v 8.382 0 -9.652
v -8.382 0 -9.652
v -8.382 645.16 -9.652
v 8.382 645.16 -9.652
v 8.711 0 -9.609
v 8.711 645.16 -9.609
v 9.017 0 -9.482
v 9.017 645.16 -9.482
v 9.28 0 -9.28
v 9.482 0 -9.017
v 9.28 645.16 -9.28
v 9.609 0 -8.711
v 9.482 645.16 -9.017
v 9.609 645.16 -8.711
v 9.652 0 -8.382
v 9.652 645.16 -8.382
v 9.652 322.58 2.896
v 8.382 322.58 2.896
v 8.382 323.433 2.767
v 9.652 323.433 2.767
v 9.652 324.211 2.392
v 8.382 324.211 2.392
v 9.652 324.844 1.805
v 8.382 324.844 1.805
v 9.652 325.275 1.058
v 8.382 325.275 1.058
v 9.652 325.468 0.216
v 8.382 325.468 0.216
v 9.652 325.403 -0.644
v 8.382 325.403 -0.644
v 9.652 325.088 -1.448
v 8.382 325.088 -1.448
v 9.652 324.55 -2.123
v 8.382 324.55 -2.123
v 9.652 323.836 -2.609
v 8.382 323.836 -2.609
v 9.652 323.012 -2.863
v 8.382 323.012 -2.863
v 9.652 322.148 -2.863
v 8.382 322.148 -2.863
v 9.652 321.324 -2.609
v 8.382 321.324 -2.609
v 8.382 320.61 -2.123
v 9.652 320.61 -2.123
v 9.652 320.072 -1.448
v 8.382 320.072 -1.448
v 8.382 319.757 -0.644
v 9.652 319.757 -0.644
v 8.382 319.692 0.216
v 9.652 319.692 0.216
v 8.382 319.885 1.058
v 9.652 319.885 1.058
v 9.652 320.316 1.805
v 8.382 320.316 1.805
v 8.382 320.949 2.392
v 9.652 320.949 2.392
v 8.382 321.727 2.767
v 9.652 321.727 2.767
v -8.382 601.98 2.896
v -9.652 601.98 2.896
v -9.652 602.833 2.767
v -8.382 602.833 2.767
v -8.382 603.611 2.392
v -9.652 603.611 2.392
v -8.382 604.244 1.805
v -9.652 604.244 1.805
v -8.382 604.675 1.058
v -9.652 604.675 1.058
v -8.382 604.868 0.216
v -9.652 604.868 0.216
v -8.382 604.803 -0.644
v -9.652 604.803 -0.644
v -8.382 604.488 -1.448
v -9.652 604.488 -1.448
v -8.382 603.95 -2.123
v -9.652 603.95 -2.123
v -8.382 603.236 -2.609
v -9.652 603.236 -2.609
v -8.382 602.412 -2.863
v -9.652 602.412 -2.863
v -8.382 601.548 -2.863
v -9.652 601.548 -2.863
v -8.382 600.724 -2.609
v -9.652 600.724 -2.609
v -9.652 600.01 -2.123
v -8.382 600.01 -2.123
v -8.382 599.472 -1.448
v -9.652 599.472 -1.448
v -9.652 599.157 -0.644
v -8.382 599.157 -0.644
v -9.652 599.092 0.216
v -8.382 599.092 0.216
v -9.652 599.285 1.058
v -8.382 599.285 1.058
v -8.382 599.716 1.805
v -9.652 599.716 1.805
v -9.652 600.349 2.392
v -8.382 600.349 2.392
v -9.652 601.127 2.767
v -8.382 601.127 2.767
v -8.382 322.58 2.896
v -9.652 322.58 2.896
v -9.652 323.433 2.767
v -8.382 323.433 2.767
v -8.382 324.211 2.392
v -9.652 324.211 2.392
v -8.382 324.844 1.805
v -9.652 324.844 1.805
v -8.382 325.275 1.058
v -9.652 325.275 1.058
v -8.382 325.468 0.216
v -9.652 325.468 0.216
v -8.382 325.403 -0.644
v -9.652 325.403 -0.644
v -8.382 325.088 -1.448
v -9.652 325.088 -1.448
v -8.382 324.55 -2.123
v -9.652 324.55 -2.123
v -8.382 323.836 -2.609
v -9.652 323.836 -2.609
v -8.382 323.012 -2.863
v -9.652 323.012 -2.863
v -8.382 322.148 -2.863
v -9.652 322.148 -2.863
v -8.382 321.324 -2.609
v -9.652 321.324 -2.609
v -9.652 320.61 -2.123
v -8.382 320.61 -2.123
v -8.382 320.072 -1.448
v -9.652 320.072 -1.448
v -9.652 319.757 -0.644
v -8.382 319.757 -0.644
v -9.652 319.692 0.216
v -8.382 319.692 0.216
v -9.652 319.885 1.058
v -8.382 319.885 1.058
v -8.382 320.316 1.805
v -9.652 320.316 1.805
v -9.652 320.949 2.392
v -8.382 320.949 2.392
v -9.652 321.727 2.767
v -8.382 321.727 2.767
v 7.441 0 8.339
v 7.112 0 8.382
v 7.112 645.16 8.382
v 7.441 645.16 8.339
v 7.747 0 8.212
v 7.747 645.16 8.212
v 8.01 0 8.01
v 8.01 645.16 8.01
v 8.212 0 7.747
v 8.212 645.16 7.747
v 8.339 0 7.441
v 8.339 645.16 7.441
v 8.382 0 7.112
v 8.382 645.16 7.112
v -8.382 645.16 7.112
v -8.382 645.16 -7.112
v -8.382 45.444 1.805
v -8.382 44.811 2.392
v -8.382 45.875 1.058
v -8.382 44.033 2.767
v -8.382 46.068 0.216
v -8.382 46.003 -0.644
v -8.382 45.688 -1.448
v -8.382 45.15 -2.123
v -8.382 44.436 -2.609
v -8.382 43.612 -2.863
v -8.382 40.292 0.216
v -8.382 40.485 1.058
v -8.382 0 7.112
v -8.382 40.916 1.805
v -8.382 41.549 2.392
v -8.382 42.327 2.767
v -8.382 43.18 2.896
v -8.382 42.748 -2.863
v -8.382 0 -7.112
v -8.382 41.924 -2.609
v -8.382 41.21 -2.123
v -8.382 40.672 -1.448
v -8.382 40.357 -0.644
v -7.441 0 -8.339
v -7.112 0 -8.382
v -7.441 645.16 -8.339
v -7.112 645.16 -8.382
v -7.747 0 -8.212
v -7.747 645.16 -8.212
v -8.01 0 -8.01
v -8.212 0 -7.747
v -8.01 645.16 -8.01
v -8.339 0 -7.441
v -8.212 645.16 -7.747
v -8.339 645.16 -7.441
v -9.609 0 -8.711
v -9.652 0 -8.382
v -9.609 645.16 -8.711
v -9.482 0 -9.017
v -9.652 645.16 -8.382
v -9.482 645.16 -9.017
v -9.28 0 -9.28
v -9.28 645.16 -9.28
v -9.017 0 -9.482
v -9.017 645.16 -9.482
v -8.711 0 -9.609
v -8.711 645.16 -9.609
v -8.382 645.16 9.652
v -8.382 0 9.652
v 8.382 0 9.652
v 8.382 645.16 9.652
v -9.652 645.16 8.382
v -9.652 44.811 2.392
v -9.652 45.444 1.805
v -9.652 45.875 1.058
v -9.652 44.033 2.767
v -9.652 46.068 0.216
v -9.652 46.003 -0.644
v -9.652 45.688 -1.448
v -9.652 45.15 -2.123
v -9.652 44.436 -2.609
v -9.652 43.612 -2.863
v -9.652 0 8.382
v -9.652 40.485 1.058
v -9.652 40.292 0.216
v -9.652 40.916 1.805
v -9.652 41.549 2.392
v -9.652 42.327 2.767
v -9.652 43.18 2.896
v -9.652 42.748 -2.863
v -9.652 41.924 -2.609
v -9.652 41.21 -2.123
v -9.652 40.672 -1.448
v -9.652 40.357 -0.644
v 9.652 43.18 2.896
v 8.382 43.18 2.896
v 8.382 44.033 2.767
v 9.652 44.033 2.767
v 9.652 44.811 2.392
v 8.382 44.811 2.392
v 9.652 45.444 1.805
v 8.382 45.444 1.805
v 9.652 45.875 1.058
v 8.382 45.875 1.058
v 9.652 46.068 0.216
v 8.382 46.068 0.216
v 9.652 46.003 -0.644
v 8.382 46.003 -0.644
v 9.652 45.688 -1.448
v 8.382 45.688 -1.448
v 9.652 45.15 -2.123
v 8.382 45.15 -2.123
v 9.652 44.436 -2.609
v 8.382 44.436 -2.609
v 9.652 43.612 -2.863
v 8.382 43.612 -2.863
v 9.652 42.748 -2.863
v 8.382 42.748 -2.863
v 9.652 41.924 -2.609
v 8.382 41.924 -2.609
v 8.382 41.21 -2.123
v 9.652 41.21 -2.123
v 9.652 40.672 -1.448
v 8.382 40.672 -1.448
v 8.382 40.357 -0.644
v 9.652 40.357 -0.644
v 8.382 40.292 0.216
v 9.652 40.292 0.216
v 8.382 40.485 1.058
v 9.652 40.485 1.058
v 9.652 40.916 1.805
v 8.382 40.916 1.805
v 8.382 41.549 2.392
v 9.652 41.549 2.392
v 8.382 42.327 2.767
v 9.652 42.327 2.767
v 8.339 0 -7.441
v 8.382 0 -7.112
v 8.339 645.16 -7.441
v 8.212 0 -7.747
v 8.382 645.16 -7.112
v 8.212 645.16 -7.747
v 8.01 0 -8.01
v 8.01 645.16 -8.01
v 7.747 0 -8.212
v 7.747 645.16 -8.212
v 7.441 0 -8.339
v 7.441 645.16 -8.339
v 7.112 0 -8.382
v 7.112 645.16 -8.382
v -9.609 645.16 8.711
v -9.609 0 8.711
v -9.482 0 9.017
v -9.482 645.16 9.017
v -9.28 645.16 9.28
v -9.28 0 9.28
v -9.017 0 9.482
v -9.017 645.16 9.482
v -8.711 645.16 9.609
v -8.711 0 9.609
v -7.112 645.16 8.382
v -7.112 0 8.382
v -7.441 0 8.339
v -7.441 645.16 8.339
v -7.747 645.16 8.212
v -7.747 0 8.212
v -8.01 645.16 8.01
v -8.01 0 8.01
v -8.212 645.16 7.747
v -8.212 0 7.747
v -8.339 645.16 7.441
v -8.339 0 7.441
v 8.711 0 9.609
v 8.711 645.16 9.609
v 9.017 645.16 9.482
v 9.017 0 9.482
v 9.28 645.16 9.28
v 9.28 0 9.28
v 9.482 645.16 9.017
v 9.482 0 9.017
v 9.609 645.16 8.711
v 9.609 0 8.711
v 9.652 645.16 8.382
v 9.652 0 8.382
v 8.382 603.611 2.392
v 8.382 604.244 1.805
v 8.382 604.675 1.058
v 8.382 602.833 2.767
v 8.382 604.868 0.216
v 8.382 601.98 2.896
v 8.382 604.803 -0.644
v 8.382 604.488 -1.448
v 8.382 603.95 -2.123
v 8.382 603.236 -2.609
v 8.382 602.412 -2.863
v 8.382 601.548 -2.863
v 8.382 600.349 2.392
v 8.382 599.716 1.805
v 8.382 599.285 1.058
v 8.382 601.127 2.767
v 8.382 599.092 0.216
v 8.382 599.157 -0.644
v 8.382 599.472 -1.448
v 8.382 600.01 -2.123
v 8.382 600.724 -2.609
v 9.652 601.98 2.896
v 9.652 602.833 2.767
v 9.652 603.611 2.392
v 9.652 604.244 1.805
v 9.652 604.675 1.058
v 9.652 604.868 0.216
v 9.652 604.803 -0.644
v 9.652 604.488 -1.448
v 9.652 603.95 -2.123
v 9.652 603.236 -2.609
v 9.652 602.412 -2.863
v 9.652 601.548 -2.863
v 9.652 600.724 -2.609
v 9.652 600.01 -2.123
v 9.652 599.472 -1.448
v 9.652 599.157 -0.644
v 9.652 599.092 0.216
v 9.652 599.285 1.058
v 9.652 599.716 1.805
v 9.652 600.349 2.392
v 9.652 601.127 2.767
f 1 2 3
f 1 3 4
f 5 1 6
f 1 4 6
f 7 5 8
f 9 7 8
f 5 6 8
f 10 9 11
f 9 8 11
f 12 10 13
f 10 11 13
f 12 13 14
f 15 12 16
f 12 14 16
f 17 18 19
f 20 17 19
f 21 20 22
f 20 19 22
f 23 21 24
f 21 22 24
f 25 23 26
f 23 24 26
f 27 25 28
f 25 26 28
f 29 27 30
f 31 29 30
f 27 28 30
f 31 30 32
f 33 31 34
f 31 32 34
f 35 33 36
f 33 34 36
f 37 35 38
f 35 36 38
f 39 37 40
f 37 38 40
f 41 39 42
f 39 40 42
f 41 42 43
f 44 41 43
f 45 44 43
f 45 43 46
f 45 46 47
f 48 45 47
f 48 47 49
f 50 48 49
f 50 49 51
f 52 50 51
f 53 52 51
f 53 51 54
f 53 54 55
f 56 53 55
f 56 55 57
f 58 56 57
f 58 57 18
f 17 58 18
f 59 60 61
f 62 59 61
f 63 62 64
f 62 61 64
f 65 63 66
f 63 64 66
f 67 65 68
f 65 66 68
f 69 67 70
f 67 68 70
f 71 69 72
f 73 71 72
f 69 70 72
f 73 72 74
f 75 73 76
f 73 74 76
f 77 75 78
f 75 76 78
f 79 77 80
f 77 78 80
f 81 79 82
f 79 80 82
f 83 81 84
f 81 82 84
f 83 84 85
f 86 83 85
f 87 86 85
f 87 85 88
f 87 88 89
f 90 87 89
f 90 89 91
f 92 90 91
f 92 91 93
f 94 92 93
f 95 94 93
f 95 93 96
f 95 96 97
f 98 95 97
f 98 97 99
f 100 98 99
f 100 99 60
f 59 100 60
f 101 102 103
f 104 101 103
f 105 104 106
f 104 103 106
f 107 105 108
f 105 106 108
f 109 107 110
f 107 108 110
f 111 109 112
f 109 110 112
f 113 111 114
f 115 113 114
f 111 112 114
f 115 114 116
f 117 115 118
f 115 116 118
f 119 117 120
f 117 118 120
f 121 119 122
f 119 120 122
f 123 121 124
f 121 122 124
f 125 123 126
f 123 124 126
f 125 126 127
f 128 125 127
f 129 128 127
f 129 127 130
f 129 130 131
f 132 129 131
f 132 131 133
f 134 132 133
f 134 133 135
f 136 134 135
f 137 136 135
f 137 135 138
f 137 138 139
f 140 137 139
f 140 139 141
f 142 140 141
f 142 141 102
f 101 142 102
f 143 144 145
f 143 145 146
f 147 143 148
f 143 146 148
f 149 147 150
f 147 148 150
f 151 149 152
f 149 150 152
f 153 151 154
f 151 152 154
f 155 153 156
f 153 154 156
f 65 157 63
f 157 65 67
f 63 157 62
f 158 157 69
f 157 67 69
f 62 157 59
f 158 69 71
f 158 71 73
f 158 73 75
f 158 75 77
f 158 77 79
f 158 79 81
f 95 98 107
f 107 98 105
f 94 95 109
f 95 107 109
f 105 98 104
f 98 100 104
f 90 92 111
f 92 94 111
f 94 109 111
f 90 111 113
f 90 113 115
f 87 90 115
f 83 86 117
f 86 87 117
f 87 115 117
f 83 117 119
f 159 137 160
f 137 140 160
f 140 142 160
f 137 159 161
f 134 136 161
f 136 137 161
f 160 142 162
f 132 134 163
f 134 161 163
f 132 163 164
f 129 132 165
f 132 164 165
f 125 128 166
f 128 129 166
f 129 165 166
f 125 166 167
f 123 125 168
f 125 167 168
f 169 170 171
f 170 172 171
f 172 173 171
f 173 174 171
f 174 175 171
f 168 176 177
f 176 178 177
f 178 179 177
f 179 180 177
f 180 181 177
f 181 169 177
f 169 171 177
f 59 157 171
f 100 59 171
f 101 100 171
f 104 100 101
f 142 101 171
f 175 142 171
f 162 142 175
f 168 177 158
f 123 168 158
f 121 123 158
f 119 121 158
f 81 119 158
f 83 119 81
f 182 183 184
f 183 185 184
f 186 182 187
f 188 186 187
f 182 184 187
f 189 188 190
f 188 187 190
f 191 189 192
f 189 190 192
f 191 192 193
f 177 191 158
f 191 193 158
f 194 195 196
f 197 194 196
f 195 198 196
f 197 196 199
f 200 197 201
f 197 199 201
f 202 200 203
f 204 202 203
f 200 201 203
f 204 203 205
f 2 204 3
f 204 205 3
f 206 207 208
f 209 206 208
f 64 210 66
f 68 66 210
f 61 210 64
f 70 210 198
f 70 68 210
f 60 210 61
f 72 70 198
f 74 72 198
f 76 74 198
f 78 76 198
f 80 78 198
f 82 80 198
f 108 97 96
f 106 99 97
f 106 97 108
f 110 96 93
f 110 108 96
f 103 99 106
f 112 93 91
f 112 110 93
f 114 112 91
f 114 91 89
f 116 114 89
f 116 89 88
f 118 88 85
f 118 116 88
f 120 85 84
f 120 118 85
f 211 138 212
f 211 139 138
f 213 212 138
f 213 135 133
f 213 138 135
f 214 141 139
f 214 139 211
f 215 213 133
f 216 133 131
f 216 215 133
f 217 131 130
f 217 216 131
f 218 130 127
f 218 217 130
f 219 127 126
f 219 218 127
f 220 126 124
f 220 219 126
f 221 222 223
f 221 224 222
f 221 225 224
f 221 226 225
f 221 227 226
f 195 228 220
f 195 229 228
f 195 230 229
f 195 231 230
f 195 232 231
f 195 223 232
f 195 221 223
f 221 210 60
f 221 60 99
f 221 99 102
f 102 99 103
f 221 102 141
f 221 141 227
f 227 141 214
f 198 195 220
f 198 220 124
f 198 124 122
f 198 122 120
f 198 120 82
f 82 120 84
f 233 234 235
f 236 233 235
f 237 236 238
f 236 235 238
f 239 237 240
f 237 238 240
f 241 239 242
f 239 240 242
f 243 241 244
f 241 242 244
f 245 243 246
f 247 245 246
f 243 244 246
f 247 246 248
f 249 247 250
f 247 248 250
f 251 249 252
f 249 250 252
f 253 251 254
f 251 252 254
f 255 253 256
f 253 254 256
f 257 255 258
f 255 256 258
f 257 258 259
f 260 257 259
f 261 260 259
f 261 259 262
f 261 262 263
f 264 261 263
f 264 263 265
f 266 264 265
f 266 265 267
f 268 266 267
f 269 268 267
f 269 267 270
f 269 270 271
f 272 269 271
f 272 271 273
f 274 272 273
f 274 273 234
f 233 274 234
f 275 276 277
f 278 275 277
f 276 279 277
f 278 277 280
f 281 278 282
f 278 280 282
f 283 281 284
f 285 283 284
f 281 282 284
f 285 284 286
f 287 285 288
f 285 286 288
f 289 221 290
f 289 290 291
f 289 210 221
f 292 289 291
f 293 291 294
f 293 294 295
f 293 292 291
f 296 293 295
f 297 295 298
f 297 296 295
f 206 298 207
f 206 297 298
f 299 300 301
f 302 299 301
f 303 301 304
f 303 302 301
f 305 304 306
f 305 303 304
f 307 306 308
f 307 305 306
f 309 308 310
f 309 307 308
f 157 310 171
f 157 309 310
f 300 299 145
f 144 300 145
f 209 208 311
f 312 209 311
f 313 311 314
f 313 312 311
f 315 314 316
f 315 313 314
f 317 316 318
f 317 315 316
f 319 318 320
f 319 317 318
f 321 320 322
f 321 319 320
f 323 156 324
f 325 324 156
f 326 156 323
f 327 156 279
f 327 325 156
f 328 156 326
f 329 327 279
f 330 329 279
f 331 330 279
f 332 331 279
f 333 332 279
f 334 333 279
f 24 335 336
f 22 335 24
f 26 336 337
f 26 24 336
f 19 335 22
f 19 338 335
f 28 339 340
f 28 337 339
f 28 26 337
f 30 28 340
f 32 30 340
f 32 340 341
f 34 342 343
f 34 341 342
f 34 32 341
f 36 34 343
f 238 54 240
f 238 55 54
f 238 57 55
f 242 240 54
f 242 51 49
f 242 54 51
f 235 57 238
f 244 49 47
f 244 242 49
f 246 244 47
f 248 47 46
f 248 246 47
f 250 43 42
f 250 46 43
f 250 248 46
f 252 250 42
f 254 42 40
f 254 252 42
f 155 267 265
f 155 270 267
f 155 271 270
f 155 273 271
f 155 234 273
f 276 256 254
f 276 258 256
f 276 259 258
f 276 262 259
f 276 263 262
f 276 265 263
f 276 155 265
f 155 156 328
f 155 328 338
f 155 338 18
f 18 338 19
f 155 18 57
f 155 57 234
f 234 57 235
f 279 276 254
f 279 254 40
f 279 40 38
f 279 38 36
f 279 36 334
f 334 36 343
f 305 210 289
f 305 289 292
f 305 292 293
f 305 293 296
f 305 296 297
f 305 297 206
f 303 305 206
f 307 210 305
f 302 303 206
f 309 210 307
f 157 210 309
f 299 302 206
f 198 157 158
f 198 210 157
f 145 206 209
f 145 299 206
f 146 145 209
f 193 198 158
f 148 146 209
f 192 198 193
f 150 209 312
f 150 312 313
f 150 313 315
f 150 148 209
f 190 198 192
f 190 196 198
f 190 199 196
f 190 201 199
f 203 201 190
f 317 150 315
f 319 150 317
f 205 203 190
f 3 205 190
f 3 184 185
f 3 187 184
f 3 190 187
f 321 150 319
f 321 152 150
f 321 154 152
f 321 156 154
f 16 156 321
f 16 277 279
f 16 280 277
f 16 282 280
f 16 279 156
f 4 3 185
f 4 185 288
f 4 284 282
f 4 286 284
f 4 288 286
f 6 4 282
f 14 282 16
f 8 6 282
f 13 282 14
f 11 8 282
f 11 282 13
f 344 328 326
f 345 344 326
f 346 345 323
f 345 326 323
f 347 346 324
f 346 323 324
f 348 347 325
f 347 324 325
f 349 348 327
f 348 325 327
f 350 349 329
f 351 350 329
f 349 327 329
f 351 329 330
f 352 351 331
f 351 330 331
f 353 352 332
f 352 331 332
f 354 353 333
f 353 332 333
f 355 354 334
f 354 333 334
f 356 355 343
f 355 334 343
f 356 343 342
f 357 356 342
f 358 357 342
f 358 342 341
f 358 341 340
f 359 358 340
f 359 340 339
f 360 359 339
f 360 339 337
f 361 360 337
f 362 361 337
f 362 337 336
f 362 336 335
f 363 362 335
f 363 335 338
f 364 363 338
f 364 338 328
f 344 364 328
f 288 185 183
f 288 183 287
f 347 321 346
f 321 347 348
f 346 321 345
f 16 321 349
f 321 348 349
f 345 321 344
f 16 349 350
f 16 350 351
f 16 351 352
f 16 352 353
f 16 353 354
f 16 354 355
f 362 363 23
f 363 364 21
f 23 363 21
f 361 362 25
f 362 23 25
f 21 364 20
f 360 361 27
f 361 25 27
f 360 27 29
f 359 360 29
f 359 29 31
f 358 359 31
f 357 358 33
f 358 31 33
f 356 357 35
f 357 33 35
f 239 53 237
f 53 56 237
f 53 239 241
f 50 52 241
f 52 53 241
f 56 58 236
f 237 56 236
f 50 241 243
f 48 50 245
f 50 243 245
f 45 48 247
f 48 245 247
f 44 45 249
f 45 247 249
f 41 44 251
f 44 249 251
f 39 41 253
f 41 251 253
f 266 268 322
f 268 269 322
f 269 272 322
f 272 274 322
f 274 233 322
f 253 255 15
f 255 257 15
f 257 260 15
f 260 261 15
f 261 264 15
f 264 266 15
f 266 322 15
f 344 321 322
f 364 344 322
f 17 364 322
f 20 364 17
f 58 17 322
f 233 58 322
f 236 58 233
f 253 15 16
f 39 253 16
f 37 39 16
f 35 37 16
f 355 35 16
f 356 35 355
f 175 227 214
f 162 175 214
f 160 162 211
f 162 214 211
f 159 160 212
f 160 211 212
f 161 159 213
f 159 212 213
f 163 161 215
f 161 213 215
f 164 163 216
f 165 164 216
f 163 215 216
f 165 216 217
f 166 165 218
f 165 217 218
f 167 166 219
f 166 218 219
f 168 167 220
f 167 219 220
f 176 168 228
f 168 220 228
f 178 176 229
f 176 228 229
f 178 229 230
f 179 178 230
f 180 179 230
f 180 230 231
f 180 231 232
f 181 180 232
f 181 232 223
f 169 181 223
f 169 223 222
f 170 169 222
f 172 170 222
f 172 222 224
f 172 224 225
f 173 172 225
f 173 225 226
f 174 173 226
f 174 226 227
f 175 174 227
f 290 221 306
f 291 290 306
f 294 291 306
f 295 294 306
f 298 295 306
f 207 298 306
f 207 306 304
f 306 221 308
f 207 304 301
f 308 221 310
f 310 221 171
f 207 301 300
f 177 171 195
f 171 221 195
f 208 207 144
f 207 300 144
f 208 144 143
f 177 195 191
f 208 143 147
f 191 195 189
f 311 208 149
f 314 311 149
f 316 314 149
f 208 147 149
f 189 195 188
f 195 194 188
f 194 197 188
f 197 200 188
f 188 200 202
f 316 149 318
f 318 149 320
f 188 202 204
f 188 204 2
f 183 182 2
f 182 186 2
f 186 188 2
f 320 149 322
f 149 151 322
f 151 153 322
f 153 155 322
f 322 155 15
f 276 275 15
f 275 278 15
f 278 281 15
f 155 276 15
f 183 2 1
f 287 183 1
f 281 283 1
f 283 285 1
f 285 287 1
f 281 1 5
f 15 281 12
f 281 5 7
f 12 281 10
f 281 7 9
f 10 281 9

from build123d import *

# Parameters (mm, degrees)
SKETCH1_W                  = 19.304
SKETCH1_H                  = 19.304
SKETCH1_W_2                = 16.764
SKETCH1_H_2                = 16.764
BOSS_EXTRUDE1_DEPTH        = 645.16
FILLET1_R                  = 1.27
F_1_0_228_DIAMETER_HOLE1_D = 5.7912


with BuildPart() as part:
    # Sketch1 → Boss-Extrude1 (new body)
    with BuildSketch(Plane(origin=(0, 0, 0), x_dir=(1, 0, 0), z_dir=(0, 1, 0))):
        Rectangle(SKETCH1_W, SKETCH1_H)
        Rectangle(SKETCH1_W_2, SKETCH1_H_2, mode=Mode.SUBTRACT)
    extrude(amount=BOSS_EXTRUDE1_DEPTH)

    # Fillet1
    fillet1_edges = [part.edges().sort_by_distance(p)[0] for p in [
        (-8.382, 322.58, 8.382),
        (8.382, 322.58, 8.382),
        (8.382, 322.58, -8.382),
        (-8.382, 322.58, -8.382),
        (9.652, 322.58, 9.652),
        (-9.652, 322.58, 9.652),
        (-9.652, 322.58, -9.652),
        (9.652, 322.58, -9.652),
    ]]
    fillet(fillet1_edges, radius=FILLET1_R)

    # #1 (0.228) Diameter Hole1 (through all)
    with Locations(Plane(origin=(9.652, 0, 0), x_dir=(0, 0, -1), z_dir=(1, 0, 0))):
        with Locations((0, 43.18), (0, 601.98), (0, 322.58)):
            Hole(F_1_0_228_DIAMETER_HOLE1_D / 2)


solid = part.part
